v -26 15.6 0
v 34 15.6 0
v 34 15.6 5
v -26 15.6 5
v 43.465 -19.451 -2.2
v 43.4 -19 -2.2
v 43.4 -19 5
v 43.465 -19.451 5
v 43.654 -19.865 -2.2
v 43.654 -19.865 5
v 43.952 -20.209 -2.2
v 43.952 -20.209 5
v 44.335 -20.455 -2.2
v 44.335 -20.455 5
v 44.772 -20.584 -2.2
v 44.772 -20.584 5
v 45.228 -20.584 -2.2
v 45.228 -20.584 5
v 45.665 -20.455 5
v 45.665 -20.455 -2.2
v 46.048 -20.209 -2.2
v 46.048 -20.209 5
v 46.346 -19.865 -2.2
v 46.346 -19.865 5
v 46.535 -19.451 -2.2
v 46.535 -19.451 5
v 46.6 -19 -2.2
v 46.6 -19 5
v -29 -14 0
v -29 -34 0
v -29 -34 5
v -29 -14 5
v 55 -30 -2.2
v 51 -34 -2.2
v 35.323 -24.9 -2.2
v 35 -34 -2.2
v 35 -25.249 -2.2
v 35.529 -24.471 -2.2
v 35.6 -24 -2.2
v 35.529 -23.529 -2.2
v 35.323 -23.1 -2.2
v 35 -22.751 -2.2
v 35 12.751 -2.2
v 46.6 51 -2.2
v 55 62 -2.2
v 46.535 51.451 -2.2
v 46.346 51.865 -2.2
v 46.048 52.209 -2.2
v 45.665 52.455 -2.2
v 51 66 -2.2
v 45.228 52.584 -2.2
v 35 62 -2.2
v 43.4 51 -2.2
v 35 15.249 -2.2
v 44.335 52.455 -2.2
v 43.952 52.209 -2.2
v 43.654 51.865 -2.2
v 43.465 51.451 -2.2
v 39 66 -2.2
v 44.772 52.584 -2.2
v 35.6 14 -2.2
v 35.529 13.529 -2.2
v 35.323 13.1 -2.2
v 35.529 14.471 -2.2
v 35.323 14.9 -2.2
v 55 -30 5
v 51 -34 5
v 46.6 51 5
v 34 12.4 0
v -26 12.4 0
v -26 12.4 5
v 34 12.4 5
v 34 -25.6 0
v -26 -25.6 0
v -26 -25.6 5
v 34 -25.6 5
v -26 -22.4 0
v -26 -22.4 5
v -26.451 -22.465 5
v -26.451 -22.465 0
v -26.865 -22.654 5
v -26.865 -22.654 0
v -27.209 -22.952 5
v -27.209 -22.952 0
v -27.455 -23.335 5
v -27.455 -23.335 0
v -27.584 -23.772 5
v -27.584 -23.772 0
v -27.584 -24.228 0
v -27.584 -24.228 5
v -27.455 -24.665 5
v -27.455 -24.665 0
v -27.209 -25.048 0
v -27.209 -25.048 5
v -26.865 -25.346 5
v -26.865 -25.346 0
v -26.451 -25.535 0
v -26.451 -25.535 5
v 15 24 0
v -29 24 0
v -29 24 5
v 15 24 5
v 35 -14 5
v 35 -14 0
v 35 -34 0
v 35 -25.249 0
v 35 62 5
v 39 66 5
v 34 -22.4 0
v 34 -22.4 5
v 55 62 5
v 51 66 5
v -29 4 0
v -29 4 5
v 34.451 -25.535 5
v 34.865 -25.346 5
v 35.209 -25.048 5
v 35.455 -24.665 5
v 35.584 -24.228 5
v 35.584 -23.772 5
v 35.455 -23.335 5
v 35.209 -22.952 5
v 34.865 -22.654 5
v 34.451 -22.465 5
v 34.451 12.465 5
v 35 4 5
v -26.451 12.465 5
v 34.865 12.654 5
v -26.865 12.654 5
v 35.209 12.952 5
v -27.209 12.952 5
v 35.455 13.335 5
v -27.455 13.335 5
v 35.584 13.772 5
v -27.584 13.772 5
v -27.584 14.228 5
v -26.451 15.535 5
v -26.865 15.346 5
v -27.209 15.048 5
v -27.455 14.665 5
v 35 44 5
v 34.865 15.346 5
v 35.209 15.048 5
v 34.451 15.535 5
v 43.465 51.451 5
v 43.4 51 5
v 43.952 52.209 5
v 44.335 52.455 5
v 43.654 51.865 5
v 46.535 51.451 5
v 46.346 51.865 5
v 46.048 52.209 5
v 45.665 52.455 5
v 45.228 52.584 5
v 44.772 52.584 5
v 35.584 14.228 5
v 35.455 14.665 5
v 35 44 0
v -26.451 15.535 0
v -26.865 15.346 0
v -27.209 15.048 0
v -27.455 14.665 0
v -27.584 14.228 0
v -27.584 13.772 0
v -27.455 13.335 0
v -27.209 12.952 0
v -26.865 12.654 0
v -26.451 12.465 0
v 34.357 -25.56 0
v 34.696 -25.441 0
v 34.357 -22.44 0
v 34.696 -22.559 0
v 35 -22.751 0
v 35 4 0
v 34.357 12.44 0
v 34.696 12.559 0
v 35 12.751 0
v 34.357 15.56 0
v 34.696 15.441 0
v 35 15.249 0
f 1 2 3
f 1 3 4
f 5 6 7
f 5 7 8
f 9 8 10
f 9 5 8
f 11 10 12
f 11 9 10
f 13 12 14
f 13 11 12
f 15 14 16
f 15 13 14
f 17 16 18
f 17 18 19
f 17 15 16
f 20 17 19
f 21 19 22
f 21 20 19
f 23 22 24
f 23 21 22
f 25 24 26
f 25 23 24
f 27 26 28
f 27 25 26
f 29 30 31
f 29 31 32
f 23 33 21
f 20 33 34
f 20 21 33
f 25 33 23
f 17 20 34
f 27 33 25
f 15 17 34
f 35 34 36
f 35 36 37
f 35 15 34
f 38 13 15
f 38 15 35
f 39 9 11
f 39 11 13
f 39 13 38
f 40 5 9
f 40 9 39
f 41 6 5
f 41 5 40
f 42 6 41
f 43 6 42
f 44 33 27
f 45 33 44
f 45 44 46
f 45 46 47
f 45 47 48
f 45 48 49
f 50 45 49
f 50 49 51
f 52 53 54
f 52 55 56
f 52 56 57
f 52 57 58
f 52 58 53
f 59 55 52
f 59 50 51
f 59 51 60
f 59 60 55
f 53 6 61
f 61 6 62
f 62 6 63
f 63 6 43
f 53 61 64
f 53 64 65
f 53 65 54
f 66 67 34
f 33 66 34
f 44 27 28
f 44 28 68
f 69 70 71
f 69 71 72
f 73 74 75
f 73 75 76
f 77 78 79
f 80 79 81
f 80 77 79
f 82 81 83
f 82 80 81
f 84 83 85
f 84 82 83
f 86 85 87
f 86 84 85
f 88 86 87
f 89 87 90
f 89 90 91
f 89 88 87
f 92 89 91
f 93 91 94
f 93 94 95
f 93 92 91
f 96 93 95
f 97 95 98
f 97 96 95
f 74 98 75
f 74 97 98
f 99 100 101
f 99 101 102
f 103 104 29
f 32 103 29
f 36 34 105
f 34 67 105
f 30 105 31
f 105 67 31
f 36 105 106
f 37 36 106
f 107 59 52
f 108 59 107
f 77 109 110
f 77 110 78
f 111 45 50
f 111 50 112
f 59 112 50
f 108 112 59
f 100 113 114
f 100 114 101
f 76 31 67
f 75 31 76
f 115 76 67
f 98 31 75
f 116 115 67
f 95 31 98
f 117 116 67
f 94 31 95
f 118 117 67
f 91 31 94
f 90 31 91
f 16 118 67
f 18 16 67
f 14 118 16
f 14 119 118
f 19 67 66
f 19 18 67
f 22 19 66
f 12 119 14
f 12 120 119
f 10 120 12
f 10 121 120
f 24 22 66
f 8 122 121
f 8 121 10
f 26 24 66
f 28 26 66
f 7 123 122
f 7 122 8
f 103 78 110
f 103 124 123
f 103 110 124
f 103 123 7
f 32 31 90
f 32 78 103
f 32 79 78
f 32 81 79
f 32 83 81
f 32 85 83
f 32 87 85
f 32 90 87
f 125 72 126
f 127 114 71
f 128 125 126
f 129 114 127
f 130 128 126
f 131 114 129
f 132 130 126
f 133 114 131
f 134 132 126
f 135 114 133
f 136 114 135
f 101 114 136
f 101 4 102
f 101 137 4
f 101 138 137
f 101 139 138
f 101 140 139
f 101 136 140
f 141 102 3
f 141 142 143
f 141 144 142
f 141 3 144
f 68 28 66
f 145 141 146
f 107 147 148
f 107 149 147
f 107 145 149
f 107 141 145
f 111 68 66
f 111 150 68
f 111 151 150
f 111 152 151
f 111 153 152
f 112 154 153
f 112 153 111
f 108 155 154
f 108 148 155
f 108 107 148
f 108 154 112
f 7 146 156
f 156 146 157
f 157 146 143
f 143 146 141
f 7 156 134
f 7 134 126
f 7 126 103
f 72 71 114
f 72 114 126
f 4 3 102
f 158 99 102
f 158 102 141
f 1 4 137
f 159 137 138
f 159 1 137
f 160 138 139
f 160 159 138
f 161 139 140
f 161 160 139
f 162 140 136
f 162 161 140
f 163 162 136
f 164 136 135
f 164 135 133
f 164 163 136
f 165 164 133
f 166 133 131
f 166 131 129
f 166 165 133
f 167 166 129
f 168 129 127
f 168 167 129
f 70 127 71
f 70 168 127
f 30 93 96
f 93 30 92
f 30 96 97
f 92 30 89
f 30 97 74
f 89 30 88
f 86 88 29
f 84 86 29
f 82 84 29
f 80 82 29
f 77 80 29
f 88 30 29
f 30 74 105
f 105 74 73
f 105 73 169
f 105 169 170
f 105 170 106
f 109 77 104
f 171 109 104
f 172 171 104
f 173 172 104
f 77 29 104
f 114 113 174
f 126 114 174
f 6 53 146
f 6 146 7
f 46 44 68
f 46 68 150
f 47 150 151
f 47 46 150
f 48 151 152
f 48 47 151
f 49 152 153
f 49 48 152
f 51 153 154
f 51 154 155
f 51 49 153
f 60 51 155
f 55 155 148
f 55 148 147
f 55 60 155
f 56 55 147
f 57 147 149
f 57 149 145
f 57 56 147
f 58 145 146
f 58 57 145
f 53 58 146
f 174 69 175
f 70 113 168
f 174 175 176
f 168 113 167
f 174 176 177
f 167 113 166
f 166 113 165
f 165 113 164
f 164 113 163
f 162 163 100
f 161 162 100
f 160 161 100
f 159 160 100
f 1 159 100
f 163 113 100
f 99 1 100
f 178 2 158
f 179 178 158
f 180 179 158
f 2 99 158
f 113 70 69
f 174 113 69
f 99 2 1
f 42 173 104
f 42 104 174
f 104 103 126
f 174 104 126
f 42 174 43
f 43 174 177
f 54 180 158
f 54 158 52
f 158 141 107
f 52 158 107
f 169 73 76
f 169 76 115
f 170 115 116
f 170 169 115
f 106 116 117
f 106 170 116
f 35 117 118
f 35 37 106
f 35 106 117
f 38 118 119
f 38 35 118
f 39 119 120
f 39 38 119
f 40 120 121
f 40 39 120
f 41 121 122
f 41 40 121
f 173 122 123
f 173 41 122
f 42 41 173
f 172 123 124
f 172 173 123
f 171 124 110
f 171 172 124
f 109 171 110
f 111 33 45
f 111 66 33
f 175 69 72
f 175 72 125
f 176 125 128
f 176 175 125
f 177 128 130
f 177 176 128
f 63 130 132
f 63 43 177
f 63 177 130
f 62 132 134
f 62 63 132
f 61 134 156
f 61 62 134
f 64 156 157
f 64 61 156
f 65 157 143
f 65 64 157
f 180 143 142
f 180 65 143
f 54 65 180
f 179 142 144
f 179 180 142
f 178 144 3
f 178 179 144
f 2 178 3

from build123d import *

# Parameters (mm, degrees)
SKETCH_1_W                  = 20
SKETCH_1_H                  = 20
SKETCH_1_W_2                = 64
SKETCH_1_H_2                = 18
SKETCH_1_H_3                = 42
EXTRUDE_1_DEPTH             = 5
SKETCH_2_W                  = 20
SKETCH_2_H                  = 100
EXTRUDE_2_DEPTH             = 2.2
HOLE_START                  = -2.2
HOLE_WIZARD_3_2_3_2_1_DEPTH = 7.2
HOLE_WIZARD_3_2_3_2_2_DEPTH = 7.2
RIB_1_REACH                 = 88.214
SKETCH_11_WALL_W            = 202.712111226
SKETCH_11_WALL_H            = 5
CHAMFER_1_SIZE              = 4


# Read off the part's stored shape, not the designer's step: Ø3.2 (3.2) 直径槽口1, Ø3.2 (3.2) 直径槽口2
with BuildPart() as part:
    # 草图1 → 凸台-拉伸1 (new body)
    with BuildSketch(Plane.XY):
        with Locations((45, -24)):
            Rectangle(SKETCH_1_W, SKETCH_1_H)
        with Locations((3, -24)):
            Rectangle(SKETCH_1_W_2, SKETCH_1_H)
        with Locations((3, 14)):
            Rectangle(SKETCH_1_W_2, SKETCH_1_H)
        with Locations((45, -5)):
            Rectangle(SKETCH_1_W, SKETCH_1_H_2)
        with Locations((45, 45)):
            Rectangle(SKETCH_1_W, SKETCH_1_H_3)
        with Locations((45, 14)):
            Rectangle(SKETCH_1_W, SKETCH_1_H)
    extrude(amount=EXTRUDE_1_DEPTH)

    # 草图2 → 凸台-拉伸2 (add)
    with BuildSketch(Plane(origin=(0, 0, 0), x_dir=(-1, 0, 0), z_dir=(0, 0, -1))):
        with Locations((-45, 16)):
            Rectangle(SKETCH_2_W, SKETCH_2_H)
    extrude(amount=EXTRUDE_2_DEPTH)

    # Ø3.2 (3.2) 直径槽口1 outline → Ø3.2 (3.2) 直径槽口1 (cut)
    with BuildSketch(Plane.XY.offset(HOLE_START)):
        with BuildLine():
            Line((34, -22.4), (-26, -22.4))
            ThreePointArc((-26, -22.4), (-27.6, -24), (-26, -25.6))
            Line((-26, -25.6), (34, -25.6))
            ThreePointArc((34, -25.6), (35.6, -24), (34, -22.4))
        make_face()
        with BuildLine():
            ThreePointArc((34, 12.4), (35.6, 14), (34, 15.6))
            Line((34, 15.6), (-26, 15.6))
            ThreePointArc((-26, 15.6), (-27.6, 14), (-26, 12.4))
            Line((-26, 12.4), (34, 12.4))
        make_face()
    extrude(amount=HOLE_WIZARD_3_2_3_2_1_DEPTH, mode=Mode.SUBTRACT)

    # Ø3.2 (3.2) 直径槽口2 outline → Ø3.2 (3.2) 直径槽口2 (cut)
    with BuildSketch(Plane.XY.offset(HOLE_START)):
        with BuildLine():
            Line((46.6, -19), (46.6, 51))
            ThreePointArc((46.6, 51), (45, 52.6), (43.4, 51))
            Line((43.4, 51), (43.4, -19))
            ThreePointArc((43.4, -19), (45, -20.6), (46.6, -19))
        make_face()
    extrude(amount=HOLE_WIZARD_3_2_3_2_2_DEPTH, mode=Mode.SUBTRACT)

    # 草图11 wall → 筋1 (add, up to next)
    with BuildSketch(Plane(origin=(25, 34, 5), x_dir=(0.707106781187, 0.707106781187, 0), z_dir=(-0.707106781187, 0.707106781187, 0)), mode=Mode.PRIVATE) as rib_1_sk1:
        with Locations((0, 2.5)):
            Rectangle(SKETCH_11_WALL_W, SKETCH_11_WALL_H)
    rib_1_tool1 = extrude(rib_1_sk1.sketch, amount=-RIB_1_REACH, mode=Mode.PRIVATE) - part.part
    add(rib_1_tool1.solids().sort_by_distance((25, 34, 5))[0])

    # 倒角1
    chamfer_1_edges = [part.edges().sort_by_distance(p)[0] for p in [
        (35, 66, 1.4),
        (55, 66, 1.4),
        (55, -34, 1.4),
    ]]
    chamfer(chamfer_1_edges, length=CHAMFER_1_SIZE)


solid = part.part
